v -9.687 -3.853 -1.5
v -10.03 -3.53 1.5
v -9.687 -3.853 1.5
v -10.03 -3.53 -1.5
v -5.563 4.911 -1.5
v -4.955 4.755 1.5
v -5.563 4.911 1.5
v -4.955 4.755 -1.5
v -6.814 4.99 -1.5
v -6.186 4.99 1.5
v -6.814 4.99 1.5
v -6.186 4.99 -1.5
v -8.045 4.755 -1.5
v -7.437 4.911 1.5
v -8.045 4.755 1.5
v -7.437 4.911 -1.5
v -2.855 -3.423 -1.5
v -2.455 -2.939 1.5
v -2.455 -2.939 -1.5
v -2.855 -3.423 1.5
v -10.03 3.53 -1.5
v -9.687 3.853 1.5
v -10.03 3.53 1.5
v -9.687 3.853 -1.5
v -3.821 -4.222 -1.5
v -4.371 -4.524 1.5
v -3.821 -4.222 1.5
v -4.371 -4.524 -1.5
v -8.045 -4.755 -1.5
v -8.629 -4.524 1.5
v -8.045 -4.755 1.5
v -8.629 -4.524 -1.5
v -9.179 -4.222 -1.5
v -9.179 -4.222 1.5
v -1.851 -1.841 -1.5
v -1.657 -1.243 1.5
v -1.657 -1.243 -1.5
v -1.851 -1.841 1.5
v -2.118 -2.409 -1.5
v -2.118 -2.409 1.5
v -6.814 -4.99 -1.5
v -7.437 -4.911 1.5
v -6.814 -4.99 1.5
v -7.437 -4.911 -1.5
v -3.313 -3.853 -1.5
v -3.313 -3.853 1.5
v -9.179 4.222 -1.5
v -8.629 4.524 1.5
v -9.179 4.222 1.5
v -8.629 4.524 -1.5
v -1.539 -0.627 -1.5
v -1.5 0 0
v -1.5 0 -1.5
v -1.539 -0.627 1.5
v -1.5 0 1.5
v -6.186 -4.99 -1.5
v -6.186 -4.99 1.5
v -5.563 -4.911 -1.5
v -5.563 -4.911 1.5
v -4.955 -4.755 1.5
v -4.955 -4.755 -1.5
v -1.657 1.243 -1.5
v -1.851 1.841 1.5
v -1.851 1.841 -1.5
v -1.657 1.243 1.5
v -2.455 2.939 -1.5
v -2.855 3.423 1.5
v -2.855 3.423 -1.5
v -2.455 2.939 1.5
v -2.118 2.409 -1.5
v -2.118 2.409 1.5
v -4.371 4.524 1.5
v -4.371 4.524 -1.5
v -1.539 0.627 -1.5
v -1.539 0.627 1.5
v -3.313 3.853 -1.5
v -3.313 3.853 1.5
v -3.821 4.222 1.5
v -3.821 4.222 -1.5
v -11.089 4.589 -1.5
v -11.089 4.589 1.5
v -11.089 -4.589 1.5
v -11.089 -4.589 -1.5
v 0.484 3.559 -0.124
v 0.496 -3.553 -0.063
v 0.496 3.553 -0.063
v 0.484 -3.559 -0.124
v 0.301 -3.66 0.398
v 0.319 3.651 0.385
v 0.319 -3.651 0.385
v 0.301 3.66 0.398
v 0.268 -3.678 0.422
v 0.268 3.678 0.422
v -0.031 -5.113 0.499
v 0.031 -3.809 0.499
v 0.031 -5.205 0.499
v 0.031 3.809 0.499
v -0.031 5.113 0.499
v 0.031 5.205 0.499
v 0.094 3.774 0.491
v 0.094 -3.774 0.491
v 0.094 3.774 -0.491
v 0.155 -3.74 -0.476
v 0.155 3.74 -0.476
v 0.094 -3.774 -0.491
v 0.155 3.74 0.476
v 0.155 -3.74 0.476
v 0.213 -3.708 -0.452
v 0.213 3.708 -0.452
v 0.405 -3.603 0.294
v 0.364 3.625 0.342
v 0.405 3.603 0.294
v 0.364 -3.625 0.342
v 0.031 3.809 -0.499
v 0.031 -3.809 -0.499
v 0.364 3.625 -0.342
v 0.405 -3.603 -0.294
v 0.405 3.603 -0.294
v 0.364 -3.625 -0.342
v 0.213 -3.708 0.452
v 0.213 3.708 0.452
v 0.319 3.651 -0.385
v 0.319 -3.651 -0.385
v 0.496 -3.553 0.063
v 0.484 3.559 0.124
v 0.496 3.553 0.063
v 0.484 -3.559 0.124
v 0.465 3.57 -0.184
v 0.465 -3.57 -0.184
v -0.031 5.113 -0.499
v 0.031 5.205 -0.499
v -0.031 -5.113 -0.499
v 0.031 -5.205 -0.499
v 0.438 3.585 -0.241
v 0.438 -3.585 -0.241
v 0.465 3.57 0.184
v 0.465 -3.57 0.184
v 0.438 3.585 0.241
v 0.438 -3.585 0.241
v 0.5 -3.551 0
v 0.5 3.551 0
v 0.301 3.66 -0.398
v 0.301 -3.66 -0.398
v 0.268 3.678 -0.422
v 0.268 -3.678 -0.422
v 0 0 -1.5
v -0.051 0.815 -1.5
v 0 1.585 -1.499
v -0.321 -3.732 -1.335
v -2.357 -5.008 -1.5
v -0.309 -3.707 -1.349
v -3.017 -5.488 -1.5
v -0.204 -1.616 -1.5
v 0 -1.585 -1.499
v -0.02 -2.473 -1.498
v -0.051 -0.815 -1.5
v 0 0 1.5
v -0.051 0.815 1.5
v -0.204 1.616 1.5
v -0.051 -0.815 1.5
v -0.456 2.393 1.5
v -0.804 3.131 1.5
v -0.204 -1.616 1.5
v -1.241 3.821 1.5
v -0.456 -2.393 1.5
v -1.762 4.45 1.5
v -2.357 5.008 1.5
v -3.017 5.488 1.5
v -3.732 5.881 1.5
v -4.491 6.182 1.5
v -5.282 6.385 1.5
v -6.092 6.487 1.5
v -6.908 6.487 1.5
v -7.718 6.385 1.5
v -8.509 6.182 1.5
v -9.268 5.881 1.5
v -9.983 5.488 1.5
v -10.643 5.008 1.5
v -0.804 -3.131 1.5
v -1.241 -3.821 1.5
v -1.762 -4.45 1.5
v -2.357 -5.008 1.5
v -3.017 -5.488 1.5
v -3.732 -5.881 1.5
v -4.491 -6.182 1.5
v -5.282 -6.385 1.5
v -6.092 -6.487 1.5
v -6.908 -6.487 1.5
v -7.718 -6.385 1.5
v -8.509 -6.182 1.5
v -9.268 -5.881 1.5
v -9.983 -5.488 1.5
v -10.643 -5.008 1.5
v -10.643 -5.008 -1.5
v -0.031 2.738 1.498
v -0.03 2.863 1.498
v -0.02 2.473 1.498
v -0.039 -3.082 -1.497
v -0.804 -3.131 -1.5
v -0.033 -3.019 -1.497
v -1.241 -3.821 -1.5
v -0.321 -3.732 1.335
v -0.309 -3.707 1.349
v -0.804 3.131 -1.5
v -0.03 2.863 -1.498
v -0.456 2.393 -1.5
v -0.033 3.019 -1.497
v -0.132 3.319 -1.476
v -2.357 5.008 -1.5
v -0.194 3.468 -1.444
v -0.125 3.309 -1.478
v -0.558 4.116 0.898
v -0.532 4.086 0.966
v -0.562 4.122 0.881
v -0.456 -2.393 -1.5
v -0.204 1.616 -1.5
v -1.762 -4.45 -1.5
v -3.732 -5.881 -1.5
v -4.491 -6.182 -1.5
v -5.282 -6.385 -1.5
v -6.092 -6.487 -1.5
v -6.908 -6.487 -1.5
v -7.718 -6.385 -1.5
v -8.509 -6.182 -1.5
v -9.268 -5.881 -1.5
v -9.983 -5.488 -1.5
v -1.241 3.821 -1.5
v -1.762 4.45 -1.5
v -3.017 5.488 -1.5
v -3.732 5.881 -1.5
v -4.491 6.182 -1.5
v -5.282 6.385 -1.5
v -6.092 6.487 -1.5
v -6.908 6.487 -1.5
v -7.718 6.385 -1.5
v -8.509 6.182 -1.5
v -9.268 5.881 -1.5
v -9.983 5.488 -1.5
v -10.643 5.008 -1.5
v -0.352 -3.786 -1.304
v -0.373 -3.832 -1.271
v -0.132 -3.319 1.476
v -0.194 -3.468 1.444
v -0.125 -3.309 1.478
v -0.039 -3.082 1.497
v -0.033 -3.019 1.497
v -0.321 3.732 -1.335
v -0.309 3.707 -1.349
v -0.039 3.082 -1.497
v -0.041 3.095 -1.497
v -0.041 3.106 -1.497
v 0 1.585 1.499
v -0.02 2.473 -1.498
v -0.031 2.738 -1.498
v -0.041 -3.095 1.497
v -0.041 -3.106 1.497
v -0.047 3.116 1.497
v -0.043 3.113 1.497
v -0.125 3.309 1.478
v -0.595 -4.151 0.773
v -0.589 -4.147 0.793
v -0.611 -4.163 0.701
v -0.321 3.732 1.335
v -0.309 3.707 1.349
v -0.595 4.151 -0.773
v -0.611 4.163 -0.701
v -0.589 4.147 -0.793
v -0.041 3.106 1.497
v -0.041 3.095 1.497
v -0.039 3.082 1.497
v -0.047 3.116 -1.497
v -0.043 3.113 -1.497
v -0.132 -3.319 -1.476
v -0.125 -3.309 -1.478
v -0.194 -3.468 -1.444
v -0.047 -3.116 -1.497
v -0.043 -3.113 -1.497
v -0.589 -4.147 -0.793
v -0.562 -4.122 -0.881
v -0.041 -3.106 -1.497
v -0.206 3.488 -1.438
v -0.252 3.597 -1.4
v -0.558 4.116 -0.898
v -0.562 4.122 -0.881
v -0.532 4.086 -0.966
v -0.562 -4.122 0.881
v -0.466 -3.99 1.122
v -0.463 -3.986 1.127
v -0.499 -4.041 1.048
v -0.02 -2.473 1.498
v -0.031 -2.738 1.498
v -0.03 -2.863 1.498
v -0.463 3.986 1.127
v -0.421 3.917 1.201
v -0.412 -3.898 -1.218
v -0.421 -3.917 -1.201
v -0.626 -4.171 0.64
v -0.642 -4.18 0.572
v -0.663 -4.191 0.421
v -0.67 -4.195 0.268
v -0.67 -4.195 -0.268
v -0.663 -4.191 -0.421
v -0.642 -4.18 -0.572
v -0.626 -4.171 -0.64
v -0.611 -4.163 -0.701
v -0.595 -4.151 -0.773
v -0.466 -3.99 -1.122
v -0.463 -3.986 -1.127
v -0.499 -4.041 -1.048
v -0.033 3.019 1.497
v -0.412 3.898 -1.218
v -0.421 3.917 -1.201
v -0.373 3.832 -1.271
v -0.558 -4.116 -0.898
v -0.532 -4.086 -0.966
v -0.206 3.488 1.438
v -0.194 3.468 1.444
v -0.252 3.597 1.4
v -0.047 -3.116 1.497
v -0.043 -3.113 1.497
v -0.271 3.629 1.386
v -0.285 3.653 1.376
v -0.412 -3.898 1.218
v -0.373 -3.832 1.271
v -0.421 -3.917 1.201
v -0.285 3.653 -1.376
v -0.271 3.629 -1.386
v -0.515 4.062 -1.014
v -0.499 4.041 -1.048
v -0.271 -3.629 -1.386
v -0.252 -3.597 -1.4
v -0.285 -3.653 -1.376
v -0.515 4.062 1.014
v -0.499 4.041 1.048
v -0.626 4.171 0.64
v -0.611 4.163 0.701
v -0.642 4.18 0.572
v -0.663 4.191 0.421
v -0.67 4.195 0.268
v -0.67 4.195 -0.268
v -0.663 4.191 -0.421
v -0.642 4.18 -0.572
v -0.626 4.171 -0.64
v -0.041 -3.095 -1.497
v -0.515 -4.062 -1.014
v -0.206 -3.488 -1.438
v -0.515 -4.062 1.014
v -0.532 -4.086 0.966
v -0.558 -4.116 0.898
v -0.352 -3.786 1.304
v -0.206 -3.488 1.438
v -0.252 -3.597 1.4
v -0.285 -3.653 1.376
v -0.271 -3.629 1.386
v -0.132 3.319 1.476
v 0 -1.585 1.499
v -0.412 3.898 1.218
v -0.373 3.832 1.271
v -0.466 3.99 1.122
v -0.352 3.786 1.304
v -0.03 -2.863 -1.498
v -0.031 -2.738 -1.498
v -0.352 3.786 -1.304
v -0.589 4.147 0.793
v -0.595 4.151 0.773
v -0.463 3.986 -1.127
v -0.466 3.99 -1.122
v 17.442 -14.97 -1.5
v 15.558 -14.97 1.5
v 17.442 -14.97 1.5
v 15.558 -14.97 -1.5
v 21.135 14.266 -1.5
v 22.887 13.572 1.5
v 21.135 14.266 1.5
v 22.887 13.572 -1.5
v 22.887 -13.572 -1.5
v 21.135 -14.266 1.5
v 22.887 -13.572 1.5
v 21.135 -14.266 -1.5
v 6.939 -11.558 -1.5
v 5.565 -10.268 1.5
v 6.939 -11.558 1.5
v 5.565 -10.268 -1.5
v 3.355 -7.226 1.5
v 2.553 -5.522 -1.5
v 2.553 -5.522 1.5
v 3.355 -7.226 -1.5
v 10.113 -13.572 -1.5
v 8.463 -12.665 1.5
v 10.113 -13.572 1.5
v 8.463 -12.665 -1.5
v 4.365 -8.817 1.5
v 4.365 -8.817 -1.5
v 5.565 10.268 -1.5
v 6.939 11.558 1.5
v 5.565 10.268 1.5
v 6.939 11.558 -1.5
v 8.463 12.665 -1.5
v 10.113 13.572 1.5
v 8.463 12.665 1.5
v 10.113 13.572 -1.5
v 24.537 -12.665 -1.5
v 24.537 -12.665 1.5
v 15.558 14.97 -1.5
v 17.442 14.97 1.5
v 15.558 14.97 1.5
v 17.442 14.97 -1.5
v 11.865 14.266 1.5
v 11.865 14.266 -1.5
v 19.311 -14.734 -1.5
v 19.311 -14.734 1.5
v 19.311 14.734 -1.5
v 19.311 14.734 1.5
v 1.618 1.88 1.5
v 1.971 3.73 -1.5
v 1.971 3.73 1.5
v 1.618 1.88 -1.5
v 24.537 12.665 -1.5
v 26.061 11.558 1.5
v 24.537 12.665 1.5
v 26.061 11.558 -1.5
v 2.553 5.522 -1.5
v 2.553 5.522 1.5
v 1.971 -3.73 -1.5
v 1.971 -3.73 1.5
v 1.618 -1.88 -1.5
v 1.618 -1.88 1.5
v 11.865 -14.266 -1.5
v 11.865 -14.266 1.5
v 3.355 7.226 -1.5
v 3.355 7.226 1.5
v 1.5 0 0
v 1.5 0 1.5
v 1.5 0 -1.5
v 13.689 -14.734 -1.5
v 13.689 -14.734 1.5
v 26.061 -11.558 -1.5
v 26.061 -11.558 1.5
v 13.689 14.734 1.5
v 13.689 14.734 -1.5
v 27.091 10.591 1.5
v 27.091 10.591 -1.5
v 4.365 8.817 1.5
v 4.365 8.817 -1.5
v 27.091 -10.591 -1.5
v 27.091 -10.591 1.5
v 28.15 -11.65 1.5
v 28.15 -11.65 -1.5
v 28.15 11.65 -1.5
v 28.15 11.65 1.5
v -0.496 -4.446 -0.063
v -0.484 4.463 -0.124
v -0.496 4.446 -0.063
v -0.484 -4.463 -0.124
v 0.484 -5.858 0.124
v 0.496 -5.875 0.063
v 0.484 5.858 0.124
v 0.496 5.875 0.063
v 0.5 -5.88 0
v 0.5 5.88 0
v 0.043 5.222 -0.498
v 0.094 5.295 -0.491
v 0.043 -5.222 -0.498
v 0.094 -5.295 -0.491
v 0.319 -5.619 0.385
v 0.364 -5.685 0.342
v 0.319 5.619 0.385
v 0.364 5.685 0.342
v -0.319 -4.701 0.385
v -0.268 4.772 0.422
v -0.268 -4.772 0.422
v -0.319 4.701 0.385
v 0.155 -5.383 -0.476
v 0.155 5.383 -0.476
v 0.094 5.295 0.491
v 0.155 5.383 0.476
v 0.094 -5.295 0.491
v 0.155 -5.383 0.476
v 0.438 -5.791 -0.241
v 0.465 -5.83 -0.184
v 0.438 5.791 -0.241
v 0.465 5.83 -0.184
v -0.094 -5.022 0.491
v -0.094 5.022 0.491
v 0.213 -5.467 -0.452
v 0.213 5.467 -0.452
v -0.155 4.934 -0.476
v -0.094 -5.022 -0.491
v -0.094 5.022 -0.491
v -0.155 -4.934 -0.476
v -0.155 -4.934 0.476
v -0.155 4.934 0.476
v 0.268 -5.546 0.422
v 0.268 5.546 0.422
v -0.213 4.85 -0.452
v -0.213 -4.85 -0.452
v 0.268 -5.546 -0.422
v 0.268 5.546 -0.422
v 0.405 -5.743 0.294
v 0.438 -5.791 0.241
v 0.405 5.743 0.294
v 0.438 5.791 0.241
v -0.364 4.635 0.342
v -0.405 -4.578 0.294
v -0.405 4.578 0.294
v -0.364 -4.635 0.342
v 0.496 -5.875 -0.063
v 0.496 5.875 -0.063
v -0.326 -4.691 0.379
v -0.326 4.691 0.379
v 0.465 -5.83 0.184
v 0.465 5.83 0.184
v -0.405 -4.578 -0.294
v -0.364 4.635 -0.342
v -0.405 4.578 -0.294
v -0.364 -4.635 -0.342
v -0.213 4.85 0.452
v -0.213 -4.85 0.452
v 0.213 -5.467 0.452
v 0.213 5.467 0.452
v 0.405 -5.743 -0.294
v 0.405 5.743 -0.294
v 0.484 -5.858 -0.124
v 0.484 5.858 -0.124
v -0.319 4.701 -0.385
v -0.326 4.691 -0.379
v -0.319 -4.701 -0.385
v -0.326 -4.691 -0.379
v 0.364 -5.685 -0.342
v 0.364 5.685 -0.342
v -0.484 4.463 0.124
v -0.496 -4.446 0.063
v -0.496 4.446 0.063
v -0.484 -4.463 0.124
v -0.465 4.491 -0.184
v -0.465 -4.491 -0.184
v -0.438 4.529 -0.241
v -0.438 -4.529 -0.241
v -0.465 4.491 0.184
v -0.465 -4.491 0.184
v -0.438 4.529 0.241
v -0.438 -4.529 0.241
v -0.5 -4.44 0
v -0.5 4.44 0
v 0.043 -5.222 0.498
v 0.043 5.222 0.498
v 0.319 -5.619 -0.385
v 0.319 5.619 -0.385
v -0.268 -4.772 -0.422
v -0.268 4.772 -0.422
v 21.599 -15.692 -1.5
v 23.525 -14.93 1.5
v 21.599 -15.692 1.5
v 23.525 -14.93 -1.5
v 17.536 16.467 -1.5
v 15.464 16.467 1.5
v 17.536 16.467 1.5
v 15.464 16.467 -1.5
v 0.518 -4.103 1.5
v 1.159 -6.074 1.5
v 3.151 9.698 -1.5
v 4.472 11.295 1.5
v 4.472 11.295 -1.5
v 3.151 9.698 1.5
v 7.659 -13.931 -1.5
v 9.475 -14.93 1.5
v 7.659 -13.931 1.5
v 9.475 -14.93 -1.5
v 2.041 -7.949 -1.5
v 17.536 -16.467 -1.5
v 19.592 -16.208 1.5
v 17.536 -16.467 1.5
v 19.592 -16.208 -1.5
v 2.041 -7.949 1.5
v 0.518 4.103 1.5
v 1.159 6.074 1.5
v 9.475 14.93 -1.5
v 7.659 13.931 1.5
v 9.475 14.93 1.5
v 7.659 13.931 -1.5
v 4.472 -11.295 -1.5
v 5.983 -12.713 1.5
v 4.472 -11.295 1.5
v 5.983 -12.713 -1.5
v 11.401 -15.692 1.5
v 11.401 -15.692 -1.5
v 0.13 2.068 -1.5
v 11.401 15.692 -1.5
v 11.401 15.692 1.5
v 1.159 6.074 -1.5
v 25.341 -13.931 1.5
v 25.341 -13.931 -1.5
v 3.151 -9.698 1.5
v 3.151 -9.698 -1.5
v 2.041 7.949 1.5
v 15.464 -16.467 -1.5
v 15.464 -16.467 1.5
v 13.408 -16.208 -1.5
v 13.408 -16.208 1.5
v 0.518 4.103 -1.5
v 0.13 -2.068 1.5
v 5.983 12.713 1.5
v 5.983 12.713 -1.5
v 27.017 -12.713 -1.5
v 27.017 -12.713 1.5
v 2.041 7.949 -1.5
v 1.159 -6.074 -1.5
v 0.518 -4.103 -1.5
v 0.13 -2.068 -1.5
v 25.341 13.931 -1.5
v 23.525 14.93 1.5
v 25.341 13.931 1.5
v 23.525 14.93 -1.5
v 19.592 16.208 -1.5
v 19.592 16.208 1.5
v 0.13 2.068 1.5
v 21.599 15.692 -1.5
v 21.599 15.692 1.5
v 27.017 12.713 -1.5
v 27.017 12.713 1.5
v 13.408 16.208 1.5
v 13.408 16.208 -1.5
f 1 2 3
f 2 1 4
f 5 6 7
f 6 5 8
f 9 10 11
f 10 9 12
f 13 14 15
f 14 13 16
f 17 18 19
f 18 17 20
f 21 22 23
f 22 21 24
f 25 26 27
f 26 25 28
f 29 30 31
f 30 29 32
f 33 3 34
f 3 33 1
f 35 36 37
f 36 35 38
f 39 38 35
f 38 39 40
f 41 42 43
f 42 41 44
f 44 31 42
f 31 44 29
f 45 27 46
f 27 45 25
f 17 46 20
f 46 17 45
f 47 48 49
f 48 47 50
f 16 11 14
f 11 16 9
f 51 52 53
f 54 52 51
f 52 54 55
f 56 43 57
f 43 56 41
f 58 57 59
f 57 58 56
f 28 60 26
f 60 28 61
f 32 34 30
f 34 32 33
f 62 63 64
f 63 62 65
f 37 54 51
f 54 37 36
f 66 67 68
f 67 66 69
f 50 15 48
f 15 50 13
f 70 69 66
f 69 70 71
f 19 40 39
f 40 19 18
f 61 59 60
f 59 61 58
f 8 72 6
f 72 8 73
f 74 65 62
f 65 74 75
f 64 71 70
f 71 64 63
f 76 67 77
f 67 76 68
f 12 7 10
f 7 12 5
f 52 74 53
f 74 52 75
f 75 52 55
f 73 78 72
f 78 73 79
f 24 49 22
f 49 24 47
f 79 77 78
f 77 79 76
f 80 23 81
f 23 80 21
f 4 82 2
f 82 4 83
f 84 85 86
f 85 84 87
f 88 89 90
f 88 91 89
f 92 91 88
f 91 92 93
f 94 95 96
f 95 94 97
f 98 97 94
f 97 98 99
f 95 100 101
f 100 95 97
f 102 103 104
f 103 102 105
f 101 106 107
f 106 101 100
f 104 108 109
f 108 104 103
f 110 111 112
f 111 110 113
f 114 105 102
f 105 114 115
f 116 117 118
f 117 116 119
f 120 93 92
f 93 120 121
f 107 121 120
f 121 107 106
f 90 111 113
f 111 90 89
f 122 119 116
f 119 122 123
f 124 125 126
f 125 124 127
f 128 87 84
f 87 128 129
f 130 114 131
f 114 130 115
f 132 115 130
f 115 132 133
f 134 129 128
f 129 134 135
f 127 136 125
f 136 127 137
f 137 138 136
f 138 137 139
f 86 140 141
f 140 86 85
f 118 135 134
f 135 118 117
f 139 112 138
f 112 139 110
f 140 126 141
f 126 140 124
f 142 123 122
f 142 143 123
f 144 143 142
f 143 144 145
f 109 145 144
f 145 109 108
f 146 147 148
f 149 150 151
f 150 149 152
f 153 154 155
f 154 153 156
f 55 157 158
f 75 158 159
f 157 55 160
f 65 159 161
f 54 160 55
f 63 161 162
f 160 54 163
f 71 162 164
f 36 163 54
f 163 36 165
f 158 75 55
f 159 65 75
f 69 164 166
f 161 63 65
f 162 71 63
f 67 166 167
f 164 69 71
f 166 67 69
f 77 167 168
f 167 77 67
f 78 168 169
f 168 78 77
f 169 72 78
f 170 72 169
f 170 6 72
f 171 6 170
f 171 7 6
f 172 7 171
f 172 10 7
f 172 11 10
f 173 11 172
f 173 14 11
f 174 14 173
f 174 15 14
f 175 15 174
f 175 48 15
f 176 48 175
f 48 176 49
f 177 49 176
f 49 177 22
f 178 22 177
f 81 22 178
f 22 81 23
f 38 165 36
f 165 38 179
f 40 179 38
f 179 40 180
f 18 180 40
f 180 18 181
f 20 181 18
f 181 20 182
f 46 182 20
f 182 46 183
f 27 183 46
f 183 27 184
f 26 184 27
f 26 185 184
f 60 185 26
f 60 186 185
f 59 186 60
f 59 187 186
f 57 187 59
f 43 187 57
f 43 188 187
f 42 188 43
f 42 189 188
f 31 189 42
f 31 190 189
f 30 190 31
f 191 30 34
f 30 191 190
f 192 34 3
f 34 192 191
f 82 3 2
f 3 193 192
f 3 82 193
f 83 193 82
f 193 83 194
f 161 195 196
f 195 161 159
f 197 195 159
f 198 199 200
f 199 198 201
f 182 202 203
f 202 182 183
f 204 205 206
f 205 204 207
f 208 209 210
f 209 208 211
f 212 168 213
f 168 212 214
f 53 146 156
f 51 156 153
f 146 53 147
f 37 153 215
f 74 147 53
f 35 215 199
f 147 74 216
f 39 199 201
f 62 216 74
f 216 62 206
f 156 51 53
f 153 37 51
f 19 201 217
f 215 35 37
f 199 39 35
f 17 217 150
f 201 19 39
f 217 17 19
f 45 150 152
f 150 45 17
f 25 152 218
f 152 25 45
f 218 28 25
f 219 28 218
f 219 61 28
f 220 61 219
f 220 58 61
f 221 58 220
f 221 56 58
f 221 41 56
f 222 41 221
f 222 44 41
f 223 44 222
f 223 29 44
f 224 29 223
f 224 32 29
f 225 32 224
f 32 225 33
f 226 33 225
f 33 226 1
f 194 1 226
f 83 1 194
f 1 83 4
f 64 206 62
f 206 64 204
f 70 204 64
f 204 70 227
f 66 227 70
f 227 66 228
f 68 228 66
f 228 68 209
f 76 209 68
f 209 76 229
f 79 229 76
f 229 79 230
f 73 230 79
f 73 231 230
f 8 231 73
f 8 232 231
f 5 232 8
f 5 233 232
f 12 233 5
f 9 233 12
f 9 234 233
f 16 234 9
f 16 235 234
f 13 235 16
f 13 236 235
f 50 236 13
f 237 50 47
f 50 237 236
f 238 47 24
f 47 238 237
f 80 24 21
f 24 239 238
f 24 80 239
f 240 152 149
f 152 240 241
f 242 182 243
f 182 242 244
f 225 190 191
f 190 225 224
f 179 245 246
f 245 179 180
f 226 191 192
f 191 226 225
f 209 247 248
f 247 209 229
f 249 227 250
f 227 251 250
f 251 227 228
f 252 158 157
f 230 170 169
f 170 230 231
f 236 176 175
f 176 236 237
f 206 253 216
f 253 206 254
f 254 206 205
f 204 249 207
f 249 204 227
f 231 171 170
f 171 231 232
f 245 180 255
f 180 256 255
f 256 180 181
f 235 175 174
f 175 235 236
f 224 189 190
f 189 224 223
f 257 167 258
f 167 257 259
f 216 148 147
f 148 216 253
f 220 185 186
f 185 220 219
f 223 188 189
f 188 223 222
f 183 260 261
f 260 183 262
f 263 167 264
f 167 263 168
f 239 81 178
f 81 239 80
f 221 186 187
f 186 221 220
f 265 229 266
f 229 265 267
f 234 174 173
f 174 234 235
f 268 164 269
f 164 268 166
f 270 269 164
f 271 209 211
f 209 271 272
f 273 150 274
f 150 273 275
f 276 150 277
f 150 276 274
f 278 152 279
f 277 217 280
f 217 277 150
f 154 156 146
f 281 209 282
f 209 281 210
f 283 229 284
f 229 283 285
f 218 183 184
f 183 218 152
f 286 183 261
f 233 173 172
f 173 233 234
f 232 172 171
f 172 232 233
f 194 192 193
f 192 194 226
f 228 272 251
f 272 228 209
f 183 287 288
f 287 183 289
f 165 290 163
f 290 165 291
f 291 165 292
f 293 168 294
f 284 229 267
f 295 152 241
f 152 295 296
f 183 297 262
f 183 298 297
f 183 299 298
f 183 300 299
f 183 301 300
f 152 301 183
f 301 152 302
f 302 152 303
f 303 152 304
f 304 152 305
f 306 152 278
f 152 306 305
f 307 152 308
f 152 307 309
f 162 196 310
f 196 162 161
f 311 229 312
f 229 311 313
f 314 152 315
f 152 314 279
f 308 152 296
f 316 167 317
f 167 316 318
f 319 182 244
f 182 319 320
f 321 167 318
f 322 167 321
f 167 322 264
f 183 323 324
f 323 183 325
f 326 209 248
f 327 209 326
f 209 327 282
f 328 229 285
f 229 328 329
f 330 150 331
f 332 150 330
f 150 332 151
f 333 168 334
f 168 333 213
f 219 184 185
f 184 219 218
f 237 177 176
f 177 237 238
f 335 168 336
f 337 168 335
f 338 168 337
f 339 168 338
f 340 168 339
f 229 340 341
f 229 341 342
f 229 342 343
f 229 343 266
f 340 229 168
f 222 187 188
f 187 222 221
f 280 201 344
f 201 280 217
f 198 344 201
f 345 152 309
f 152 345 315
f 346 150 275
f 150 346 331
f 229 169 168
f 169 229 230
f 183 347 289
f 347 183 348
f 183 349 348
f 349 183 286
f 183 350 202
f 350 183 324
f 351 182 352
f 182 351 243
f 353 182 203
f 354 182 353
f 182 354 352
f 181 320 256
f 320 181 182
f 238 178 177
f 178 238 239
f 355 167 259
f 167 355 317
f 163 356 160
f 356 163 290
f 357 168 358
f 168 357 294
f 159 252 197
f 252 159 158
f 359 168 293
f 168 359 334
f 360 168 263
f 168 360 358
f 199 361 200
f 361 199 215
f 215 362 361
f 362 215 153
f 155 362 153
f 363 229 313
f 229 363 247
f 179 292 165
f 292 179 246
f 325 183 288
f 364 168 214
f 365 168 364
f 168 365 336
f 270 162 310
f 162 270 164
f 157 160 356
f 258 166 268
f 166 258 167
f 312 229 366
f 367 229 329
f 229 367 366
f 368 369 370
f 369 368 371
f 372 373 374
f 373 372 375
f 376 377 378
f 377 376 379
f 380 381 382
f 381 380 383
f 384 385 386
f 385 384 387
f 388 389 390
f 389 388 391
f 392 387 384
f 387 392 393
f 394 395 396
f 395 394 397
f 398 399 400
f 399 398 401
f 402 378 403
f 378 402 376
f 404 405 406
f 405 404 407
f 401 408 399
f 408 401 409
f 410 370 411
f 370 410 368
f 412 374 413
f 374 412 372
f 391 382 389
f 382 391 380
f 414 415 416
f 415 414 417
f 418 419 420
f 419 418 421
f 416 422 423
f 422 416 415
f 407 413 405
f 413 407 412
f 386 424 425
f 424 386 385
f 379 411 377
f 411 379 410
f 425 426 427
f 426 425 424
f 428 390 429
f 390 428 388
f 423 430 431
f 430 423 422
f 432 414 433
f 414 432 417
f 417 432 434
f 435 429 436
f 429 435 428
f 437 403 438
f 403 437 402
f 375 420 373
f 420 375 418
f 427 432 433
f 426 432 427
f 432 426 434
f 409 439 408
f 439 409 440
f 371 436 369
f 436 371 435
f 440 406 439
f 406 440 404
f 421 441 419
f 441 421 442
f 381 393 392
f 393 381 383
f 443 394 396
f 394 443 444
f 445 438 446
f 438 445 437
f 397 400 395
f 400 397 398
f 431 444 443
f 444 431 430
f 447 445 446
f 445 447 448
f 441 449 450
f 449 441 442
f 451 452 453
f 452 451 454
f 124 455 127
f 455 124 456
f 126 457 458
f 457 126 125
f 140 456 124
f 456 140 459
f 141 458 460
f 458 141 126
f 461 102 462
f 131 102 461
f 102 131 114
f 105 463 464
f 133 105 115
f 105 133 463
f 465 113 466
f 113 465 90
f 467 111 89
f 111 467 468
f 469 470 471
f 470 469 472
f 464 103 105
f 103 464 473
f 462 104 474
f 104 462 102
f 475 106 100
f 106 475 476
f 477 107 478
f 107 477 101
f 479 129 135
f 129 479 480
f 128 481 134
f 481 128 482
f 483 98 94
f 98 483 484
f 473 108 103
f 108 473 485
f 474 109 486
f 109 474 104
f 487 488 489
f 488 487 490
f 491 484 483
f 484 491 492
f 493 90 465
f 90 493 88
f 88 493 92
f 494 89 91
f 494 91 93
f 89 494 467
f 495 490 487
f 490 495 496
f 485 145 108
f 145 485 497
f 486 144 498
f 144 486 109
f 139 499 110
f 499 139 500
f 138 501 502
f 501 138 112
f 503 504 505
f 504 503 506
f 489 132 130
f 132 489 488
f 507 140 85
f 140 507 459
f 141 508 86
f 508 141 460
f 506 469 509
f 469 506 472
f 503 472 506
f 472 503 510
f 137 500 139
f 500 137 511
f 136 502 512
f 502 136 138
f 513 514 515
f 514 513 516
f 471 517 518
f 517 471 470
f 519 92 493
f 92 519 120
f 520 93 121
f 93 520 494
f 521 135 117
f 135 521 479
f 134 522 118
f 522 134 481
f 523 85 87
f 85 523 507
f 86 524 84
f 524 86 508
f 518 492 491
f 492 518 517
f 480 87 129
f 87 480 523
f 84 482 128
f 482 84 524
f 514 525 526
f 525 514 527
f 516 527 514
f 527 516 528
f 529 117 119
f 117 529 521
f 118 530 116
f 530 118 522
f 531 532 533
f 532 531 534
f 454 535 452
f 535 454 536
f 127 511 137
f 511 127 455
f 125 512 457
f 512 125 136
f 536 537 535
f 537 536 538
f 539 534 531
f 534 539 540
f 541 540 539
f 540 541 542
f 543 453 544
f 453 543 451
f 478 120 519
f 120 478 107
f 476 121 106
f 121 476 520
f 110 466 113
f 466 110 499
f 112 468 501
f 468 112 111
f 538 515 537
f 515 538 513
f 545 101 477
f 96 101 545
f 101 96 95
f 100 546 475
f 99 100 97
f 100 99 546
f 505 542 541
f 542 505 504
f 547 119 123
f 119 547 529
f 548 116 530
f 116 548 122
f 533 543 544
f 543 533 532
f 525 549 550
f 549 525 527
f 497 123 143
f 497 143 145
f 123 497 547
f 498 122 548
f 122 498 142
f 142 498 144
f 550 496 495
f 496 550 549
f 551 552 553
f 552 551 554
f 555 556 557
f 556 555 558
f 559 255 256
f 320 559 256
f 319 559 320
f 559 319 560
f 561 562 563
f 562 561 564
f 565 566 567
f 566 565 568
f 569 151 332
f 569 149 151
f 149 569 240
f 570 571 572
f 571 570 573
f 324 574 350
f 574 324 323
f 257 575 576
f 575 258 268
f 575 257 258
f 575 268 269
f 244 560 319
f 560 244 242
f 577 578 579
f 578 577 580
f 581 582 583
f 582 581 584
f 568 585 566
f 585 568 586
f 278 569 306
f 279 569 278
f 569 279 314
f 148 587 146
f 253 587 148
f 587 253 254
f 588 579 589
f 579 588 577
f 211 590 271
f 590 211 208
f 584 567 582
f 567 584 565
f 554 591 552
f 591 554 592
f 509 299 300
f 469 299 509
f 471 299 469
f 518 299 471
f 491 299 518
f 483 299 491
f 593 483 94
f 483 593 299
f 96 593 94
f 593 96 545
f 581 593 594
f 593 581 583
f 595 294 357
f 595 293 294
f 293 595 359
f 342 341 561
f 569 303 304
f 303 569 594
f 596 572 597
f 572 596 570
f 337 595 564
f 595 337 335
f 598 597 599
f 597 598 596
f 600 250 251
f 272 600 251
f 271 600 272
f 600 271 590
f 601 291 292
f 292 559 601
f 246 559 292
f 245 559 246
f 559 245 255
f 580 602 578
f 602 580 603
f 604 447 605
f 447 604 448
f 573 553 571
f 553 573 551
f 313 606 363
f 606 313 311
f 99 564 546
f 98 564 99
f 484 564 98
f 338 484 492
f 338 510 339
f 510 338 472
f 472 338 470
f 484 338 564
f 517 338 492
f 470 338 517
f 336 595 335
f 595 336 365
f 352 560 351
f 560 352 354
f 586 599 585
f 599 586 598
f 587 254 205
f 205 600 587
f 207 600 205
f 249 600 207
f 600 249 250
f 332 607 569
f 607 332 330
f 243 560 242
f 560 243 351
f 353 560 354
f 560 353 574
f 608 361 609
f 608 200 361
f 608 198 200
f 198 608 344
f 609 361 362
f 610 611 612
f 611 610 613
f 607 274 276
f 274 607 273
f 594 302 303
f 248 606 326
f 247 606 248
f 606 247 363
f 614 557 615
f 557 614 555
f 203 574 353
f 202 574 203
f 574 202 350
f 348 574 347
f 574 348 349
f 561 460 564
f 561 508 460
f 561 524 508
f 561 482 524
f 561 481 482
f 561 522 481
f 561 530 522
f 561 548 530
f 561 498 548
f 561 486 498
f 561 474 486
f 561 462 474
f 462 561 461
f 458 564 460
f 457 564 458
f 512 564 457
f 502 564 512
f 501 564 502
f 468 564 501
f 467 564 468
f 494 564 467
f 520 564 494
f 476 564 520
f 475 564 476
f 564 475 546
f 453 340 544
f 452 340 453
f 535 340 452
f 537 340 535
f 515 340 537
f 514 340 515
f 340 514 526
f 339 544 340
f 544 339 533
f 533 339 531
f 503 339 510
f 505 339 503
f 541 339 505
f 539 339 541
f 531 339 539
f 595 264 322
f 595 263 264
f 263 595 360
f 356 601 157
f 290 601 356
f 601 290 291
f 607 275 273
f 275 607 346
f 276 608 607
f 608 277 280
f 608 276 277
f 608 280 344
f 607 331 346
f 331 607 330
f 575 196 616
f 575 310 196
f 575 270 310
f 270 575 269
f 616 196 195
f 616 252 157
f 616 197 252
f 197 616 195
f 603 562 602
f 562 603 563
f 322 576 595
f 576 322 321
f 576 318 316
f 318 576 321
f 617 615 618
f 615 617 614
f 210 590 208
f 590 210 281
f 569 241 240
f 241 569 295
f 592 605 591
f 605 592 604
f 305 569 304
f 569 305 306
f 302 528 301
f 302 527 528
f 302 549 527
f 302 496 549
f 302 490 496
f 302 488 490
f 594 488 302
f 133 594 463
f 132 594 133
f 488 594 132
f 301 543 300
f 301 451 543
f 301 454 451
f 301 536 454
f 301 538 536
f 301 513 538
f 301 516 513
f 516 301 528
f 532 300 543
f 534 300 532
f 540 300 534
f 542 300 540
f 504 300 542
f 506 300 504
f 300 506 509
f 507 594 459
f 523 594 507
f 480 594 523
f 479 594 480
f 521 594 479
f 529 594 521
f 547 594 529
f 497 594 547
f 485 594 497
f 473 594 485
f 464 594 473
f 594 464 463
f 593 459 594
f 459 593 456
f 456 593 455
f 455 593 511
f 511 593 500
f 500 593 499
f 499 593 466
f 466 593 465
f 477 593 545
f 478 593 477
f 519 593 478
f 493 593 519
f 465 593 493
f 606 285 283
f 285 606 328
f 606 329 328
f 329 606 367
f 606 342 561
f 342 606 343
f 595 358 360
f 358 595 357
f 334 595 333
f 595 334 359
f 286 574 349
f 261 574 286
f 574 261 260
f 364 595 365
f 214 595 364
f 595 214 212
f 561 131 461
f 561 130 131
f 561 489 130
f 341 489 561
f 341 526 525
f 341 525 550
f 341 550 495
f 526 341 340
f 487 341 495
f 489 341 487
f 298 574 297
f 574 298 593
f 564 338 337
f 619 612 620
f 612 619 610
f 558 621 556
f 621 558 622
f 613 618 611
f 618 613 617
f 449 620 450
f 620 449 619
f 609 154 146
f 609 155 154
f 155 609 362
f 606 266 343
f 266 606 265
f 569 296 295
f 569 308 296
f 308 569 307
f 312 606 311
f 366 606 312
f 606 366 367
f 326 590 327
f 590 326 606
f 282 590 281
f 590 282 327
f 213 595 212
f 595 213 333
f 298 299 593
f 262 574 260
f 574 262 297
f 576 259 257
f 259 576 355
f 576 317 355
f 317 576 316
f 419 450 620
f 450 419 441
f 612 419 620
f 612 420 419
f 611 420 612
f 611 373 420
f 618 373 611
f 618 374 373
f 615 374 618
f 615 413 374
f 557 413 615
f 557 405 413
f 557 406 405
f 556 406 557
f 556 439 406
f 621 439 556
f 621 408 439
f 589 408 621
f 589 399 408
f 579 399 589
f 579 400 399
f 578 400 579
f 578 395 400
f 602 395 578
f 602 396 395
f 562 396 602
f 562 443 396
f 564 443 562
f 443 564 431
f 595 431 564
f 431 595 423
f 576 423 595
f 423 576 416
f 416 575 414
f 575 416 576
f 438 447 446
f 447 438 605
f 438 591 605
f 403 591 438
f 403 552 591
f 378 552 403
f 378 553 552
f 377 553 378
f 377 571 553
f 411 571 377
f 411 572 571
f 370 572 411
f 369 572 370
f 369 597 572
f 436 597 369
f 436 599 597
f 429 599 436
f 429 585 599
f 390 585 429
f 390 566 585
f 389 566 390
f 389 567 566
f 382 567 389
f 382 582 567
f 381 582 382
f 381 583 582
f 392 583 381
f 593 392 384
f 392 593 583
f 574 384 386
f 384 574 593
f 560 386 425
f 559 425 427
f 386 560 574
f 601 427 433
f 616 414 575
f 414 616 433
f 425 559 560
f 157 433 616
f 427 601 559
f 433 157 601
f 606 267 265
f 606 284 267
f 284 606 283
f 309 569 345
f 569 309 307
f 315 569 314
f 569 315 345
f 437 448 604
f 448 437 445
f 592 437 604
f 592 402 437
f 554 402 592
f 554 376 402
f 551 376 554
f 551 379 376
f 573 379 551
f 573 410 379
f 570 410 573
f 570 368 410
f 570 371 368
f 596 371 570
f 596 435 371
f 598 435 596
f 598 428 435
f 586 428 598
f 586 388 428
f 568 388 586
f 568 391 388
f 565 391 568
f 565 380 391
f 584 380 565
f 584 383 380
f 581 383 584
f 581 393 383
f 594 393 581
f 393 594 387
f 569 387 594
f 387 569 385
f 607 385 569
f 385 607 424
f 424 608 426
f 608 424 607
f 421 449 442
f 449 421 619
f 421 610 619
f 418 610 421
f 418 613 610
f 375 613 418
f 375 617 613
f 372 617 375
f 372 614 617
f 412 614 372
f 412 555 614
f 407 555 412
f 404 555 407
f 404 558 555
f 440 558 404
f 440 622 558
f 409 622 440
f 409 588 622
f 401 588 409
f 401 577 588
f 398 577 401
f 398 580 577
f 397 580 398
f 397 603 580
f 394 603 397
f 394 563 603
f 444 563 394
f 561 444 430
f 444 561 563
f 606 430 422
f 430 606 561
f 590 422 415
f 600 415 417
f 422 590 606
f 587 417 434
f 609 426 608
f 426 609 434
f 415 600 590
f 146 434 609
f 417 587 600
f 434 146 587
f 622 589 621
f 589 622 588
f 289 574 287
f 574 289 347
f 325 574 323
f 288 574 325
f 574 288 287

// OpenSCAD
//+-------------------------------------------------+
//|  OPENSCAD double pipe clamp - c0c0chane1 clamp  |
//|        2015 gaziel@gmail.com                    |
//+- -----------------------------------------------+   
   
// Diameter for the first Pipe
dp1= 30;
// Diameter for the first Pipe
dp2= 10;
//Thinkness=5;
ep=3;

//hole for colson, rilsan or hose clamp
dh=1;//hole diameter for the hose clamp, "0" for no-hole.
$fn=50;

orientation=0;//Orientation in degree (zero for straight)

translate([-(dp2+ep)/2,0,0])rotate([0,0,180])ring(dp2,0);
translate([(dp1+ep)/2,0,0])ring(dp1,orientation);

module ring(dp,or){;
    difference(){
        hull(){
            rotate([or,0,0])cylinder(d=dp+ep,h=ep, center=true);
            translate([-(dp+ep)/2,0,0])rotate([90,0,0])cylinder(d=ep,h=2*ep, center=true);
        }
        rotate([or,0,0]){
        union(){
            cylinder(d=dp,h=dp, center=true);
            rotate([0,0,225]) translate([-dp,0,-dp*3])cube([dp,dp,6*dp]);
            translate([-(dp+ep)/2,0,0])rotate([90,0,0])cylinder(d=dh,h=3*ep, center=true);    
            }
        }
        translate([-(dp+ep)/2,0,0])rotate([90,0,0])cylinder(d=dh,h=dp*ep, center=true);   
    }
}
